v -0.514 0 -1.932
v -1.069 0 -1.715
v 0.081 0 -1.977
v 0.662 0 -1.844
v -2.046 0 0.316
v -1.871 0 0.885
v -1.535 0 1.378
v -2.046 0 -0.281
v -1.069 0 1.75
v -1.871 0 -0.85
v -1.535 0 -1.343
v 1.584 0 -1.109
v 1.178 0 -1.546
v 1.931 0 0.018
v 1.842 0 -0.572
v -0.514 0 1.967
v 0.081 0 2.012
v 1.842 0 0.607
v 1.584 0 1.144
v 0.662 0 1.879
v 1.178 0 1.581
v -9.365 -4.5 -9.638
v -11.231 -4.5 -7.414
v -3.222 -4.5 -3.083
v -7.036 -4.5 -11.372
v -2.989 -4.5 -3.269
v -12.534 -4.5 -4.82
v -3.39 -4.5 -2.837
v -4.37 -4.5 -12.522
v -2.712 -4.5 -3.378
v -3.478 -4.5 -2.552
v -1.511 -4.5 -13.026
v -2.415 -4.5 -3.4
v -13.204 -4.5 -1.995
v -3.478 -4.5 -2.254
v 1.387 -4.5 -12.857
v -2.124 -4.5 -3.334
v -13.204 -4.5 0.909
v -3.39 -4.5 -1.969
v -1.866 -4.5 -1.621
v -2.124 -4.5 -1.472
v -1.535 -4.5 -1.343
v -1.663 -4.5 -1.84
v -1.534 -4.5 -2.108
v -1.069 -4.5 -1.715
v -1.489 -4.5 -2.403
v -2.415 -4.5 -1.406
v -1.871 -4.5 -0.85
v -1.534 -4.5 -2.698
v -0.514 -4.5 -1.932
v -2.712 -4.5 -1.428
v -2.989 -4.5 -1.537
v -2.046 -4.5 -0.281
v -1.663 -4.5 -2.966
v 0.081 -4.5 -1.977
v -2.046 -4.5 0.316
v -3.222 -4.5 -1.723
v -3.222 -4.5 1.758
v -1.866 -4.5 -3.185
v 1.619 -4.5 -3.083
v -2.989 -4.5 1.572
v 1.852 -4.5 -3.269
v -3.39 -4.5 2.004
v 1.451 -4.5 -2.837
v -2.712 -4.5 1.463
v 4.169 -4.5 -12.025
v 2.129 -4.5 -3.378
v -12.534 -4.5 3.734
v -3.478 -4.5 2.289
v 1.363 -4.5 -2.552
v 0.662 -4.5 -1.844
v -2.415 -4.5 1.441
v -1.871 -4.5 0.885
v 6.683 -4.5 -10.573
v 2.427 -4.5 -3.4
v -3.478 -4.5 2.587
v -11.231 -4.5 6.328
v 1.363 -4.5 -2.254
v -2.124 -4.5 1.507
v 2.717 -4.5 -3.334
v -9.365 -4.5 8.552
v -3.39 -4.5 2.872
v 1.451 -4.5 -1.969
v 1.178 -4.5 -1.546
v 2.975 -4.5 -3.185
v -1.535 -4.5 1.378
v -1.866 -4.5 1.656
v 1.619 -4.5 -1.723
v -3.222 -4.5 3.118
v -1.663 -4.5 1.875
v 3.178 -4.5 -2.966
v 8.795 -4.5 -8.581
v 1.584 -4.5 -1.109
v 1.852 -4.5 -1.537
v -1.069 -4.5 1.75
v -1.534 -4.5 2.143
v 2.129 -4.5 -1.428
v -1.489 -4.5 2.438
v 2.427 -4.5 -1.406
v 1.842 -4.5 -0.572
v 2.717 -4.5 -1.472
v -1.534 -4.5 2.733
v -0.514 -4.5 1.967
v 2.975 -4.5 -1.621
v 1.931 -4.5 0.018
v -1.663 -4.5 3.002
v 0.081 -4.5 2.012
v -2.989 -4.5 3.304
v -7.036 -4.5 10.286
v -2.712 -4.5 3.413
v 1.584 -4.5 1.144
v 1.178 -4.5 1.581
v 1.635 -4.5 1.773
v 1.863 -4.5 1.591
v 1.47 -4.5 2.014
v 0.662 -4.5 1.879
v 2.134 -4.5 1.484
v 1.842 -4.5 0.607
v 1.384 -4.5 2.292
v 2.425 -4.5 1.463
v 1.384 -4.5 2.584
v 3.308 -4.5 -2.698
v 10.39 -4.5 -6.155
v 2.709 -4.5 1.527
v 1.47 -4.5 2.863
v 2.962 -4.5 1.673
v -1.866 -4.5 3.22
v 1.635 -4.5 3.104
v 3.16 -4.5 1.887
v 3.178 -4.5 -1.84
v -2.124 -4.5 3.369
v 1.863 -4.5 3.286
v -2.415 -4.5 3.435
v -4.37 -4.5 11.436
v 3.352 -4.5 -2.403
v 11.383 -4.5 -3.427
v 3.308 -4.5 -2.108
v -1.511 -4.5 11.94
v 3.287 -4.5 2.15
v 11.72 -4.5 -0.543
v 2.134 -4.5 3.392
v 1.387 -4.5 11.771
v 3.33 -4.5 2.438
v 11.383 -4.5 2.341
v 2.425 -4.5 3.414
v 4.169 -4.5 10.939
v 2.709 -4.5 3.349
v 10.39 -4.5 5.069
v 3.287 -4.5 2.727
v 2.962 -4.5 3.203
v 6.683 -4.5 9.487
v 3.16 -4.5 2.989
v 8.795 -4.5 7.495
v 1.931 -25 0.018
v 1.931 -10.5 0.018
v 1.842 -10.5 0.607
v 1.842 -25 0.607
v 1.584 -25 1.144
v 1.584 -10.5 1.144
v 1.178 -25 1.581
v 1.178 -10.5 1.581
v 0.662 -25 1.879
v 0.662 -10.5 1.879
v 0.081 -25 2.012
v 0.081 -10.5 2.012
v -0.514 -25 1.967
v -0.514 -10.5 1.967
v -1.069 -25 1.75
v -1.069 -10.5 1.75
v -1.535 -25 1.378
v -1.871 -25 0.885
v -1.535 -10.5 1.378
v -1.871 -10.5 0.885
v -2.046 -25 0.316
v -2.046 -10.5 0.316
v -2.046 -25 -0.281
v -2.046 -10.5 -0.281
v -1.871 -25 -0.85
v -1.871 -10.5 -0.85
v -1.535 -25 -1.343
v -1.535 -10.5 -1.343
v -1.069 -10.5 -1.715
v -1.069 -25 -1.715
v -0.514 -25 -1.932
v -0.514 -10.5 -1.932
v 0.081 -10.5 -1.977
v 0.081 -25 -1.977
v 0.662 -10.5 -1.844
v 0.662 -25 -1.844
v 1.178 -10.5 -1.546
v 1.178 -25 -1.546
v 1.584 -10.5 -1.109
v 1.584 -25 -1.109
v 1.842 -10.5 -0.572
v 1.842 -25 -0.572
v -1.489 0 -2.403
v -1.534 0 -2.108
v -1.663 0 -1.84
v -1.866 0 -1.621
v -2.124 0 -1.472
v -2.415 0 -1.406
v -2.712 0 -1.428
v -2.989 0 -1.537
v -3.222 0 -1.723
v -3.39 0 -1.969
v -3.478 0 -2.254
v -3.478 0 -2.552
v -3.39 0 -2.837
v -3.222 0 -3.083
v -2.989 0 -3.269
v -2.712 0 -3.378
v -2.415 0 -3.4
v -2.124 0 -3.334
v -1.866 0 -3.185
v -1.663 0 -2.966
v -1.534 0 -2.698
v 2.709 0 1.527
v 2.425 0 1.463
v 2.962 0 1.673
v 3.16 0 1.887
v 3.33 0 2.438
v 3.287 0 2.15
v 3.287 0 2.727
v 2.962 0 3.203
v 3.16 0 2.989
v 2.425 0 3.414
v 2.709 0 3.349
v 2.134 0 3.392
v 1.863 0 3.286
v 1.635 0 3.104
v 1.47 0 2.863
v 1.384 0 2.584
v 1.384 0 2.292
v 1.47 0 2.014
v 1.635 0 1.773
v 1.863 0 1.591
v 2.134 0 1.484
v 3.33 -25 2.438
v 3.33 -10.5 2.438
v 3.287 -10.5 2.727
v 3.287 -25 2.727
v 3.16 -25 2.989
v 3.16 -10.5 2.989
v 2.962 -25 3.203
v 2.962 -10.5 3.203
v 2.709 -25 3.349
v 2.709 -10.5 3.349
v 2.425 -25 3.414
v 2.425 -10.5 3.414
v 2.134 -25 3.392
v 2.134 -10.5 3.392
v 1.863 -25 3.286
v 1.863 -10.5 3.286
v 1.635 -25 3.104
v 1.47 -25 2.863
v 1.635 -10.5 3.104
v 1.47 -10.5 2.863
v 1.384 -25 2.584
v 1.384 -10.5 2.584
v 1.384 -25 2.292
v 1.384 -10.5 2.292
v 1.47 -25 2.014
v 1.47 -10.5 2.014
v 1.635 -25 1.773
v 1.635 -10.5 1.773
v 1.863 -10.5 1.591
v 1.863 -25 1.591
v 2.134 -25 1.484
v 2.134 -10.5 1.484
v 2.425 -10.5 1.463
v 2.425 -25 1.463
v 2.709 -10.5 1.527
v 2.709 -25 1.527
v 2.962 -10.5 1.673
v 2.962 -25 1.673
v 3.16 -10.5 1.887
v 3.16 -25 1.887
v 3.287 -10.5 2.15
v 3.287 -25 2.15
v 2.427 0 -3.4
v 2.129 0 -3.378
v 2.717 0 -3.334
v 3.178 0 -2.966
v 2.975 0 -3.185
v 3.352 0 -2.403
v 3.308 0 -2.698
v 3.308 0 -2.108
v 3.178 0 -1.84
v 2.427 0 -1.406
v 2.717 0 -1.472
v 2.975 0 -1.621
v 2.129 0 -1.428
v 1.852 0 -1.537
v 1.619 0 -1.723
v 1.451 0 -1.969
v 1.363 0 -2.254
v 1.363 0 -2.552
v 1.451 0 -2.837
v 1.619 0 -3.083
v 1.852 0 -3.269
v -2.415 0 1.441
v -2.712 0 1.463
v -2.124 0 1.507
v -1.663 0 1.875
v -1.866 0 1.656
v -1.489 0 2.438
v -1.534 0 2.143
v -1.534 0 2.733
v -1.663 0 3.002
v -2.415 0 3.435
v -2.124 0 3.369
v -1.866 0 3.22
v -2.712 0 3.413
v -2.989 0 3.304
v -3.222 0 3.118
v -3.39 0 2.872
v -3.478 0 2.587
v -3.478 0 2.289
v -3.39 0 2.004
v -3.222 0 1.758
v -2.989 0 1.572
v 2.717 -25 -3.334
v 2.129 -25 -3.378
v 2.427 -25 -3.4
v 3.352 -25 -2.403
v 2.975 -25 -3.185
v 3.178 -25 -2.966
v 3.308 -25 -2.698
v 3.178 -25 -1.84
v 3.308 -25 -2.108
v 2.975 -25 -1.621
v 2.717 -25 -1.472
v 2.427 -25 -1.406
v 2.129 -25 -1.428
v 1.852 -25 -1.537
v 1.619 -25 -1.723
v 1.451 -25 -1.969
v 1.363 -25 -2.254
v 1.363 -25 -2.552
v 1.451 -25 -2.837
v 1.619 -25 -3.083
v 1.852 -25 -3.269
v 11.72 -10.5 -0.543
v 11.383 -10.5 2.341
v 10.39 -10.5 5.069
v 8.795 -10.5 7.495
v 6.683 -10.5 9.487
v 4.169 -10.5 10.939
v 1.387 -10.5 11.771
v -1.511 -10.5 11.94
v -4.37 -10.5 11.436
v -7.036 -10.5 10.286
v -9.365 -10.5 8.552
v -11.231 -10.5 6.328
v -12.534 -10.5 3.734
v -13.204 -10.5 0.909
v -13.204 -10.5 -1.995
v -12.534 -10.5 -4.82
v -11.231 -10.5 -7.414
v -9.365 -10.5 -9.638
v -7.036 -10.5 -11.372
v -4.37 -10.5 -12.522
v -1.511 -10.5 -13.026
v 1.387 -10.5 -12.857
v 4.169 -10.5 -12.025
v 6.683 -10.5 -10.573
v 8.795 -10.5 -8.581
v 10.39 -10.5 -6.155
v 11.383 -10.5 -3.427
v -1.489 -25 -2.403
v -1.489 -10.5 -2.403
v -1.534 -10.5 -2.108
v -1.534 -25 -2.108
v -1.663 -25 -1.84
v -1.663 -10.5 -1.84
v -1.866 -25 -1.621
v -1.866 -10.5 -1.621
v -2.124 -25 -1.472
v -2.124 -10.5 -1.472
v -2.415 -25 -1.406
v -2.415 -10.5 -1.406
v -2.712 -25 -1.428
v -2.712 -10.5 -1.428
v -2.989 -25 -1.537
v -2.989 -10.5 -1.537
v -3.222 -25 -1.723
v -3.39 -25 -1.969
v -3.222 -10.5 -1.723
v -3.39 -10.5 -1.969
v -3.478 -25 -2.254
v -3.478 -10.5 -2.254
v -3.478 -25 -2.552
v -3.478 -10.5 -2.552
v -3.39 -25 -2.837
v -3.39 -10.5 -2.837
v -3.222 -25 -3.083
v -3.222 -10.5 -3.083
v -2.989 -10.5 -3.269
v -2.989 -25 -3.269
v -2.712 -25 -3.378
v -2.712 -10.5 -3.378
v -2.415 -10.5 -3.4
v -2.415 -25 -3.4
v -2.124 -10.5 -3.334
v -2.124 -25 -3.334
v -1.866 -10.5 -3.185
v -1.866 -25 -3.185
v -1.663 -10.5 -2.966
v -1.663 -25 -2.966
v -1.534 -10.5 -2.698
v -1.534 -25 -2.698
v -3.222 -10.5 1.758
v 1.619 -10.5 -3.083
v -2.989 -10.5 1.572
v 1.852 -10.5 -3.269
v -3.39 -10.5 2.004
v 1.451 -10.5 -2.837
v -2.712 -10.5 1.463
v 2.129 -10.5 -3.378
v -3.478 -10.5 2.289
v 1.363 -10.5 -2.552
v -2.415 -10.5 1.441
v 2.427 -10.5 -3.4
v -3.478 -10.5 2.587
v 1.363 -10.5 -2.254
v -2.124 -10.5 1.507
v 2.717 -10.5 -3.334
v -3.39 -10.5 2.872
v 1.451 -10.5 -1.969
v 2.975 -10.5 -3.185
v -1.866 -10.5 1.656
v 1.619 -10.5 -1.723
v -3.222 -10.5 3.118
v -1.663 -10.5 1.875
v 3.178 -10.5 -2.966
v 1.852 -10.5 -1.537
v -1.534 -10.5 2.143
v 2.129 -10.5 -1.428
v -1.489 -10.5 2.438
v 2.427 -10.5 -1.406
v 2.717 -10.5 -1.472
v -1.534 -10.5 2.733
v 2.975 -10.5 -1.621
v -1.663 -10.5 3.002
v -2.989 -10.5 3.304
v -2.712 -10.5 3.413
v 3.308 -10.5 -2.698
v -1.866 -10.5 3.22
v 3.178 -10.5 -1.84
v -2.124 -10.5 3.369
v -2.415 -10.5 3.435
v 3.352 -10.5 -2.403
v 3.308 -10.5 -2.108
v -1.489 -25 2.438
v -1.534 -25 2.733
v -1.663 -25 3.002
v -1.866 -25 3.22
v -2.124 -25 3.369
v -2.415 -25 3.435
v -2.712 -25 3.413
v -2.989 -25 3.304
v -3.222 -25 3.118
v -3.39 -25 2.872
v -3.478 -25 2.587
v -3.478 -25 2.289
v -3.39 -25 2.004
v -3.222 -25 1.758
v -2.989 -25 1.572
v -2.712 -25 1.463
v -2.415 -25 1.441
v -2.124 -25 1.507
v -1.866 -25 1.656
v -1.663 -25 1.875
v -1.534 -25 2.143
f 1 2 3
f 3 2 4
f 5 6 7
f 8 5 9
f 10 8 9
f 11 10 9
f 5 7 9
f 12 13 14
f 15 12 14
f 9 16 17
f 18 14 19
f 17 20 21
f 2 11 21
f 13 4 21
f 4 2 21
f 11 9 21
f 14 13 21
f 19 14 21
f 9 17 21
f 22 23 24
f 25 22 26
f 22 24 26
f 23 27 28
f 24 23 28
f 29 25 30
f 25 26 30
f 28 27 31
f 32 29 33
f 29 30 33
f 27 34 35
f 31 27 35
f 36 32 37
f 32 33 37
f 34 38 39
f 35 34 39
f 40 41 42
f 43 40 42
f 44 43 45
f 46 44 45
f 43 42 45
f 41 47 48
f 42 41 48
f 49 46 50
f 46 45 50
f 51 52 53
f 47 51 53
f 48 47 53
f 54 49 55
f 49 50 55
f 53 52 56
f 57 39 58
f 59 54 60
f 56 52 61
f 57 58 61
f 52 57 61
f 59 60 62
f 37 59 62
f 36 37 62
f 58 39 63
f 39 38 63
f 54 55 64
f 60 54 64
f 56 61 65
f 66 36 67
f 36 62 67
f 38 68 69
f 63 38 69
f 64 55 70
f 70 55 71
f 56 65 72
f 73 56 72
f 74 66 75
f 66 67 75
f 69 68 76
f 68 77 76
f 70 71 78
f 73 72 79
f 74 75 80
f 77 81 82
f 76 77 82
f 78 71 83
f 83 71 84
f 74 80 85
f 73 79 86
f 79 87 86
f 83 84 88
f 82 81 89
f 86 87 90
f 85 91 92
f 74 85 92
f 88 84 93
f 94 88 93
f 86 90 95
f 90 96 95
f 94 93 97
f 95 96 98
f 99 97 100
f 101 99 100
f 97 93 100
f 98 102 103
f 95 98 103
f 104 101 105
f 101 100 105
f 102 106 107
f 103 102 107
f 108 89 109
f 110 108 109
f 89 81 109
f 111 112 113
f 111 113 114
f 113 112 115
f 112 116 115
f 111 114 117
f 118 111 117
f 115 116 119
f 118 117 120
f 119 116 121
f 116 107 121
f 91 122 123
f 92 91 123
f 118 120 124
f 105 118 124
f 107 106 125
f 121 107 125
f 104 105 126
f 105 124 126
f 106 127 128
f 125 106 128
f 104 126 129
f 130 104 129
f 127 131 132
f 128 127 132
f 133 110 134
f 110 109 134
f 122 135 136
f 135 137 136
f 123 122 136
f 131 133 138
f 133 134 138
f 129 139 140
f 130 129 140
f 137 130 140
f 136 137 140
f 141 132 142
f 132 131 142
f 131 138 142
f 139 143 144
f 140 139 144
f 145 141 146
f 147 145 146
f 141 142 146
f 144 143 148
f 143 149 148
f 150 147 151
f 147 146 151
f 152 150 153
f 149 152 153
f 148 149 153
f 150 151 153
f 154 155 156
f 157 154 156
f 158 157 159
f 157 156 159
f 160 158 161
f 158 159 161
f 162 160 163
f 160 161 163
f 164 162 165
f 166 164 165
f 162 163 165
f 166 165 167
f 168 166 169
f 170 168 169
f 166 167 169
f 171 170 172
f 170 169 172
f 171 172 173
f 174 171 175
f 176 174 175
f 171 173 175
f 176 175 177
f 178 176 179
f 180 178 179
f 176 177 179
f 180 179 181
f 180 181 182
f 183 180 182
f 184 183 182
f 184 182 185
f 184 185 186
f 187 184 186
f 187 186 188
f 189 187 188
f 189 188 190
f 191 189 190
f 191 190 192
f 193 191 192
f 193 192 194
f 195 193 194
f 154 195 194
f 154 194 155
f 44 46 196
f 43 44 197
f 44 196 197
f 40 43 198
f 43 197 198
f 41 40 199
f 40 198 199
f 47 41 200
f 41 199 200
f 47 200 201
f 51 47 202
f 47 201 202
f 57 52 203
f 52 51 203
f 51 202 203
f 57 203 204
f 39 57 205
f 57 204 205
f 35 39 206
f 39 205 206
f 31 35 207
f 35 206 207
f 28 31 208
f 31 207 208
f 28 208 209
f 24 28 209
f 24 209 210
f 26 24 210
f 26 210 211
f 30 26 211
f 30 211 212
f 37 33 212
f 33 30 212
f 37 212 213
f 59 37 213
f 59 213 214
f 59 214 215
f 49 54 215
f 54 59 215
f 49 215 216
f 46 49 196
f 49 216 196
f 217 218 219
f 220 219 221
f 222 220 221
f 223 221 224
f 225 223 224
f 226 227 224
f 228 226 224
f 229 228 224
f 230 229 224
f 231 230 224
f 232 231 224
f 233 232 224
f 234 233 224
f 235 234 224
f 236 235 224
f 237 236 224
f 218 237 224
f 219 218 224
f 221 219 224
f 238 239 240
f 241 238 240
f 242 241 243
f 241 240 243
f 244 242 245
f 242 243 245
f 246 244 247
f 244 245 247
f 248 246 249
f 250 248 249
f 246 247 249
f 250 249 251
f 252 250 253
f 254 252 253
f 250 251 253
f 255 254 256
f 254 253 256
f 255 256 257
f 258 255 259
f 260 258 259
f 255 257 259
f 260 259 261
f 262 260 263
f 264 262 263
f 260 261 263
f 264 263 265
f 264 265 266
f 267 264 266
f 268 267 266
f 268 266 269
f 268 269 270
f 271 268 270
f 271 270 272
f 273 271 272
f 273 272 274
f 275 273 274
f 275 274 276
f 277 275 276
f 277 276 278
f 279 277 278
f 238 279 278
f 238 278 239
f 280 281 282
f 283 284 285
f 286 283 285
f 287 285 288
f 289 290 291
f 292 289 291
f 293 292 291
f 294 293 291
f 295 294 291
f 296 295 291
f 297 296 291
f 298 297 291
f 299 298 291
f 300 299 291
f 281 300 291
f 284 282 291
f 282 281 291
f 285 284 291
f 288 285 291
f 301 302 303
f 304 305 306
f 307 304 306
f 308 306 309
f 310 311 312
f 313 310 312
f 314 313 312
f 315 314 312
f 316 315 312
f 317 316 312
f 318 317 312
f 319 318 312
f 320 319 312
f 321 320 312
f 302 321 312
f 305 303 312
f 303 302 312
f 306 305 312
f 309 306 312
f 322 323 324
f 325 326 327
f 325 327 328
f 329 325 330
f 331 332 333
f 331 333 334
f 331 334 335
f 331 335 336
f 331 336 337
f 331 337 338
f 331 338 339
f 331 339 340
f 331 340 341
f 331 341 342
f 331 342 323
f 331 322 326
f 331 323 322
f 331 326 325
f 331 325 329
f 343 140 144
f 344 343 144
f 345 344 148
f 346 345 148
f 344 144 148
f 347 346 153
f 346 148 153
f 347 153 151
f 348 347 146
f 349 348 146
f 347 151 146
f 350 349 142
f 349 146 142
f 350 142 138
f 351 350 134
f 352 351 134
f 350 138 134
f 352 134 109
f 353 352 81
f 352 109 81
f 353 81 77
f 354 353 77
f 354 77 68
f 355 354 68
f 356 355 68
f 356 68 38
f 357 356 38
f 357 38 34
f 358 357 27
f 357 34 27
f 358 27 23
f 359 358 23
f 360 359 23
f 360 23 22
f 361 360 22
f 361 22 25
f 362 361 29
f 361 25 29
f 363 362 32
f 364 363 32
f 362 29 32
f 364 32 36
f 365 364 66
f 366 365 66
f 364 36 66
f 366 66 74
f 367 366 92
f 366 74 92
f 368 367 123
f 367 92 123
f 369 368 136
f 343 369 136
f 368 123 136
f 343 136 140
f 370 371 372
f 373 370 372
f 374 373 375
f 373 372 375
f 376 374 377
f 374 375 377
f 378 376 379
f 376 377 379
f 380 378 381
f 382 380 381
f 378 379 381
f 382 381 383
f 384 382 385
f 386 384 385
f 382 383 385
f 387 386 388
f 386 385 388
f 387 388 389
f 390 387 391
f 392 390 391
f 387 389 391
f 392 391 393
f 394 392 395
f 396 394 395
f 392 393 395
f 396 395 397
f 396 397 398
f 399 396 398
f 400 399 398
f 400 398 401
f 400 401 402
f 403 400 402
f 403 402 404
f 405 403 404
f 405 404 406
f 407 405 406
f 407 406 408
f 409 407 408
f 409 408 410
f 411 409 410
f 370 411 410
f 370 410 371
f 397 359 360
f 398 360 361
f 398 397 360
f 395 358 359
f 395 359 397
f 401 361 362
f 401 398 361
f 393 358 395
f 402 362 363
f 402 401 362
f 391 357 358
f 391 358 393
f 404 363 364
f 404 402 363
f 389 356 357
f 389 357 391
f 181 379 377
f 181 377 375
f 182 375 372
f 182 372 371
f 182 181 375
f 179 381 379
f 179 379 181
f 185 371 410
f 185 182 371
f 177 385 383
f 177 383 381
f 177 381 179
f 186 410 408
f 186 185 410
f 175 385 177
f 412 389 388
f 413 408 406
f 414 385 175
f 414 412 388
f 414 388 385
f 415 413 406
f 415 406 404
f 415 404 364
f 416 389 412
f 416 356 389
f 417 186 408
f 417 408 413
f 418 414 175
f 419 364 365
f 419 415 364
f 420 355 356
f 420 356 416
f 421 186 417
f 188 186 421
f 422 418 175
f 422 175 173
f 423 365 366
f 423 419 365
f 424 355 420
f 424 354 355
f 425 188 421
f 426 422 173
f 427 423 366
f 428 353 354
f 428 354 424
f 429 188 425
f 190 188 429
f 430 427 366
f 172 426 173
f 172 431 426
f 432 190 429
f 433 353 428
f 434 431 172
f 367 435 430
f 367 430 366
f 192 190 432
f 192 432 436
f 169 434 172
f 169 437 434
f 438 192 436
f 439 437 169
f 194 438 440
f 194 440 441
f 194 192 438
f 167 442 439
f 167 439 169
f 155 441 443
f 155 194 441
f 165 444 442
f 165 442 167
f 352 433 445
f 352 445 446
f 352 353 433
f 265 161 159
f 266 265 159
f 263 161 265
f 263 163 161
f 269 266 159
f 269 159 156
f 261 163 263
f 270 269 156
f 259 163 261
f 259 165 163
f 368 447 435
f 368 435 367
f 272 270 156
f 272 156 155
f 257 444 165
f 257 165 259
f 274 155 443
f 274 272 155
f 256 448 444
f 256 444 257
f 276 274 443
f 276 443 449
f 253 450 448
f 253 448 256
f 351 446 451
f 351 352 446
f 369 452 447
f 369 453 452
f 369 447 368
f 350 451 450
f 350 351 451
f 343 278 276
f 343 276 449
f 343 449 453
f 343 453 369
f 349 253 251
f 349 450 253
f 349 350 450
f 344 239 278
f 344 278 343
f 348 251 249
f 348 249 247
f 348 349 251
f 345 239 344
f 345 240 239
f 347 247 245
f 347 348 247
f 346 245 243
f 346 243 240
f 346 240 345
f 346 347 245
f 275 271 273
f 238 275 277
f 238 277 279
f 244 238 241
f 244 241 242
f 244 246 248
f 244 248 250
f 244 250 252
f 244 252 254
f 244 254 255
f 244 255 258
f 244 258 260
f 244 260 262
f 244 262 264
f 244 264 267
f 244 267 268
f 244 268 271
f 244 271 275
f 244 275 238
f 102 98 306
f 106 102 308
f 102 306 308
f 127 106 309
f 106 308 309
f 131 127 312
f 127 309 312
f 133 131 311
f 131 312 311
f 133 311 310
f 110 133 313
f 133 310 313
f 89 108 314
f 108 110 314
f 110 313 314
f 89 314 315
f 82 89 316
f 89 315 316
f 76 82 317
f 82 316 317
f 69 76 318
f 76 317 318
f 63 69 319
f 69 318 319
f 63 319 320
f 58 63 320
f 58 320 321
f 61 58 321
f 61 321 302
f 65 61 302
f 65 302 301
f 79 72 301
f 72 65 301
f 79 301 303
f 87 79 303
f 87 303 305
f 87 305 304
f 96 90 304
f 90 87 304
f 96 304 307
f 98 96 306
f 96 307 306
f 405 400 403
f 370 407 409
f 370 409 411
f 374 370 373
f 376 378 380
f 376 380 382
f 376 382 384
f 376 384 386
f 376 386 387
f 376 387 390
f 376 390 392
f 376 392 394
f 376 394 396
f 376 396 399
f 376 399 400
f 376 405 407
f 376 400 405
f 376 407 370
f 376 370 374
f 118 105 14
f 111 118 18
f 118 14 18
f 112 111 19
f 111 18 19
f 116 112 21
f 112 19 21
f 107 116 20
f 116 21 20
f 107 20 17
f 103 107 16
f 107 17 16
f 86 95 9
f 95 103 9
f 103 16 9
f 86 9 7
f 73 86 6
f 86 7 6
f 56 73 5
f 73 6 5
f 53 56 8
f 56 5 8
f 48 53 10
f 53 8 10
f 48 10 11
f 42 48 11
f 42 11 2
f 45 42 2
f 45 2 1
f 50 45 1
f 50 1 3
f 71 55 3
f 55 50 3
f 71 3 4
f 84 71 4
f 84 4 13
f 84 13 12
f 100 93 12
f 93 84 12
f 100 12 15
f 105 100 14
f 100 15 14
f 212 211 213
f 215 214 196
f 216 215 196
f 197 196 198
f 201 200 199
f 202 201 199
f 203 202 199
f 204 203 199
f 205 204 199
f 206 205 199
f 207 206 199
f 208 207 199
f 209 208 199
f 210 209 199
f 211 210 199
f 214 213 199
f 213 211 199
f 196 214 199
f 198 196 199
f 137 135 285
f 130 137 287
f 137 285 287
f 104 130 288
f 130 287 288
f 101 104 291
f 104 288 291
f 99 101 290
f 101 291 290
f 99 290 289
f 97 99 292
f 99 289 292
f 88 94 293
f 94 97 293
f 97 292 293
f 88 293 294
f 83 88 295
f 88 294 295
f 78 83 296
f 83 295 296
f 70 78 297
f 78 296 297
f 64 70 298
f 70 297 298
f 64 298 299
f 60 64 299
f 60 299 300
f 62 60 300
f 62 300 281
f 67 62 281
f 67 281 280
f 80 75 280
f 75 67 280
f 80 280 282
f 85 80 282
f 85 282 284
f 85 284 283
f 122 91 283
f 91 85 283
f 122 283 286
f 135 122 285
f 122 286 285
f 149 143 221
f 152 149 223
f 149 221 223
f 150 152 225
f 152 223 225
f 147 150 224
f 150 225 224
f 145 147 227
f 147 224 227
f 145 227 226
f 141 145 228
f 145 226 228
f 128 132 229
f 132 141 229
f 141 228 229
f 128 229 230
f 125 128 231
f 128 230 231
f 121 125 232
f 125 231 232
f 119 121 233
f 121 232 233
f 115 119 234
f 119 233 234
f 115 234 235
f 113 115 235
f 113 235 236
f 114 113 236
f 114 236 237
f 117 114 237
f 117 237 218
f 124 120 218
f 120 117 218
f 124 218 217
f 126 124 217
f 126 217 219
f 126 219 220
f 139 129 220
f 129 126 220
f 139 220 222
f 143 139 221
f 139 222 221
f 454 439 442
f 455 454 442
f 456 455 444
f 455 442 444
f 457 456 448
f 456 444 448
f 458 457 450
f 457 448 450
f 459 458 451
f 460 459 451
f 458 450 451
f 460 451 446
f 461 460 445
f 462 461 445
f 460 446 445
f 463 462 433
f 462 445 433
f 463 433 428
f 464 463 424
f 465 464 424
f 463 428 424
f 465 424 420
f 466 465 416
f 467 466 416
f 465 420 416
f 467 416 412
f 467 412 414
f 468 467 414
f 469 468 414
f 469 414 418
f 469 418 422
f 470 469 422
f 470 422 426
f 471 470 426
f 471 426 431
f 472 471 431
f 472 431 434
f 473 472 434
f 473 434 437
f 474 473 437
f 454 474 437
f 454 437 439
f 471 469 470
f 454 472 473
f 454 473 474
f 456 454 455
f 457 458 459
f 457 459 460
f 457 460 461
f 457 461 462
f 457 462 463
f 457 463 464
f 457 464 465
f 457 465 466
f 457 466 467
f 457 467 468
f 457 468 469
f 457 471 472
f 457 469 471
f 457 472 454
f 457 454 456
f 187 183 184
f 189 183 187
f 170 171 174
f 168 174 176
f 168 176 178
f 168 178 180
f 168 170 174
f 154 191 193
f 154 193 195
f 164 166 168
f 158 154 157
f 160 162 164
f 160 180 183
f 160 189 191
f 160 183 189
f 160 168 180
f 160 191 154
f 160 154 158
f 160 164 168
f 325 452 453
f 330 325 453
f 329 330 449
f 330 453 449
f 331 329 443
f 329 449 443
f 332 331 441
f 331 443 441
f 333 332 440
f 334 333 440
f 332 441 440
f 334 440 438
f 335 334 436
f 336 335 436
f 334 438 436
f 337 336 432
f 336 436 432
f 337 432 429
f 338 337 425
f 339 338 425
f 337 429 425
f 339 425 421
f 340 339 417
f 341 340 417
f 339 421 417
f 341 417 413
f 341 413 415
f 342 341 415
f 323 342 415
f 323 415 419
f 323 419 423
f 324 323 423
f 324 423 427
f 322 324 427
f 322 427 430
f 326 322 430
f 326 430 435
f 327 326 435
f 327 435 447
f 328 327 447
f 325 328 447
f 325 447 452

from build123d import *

# Parameters (mm, degrees)
F0_R     = 12.504289
F1_DEPTH = 6
F2_R     = 1
F2_R_2   = 0.978426
F2_R_3   = 2
F4_DEPTH = 25


with BuildPart() as f1:
    # F0 (on Front) → F1 (new body)
    with BuildSketch(Plane.XZ):
        with Locations((-13.58404, 22.957029)):
            Circle(F0_R)
    extrude(amount=F1_DEPTH)


with BuildPart() as f1_1:
    # F3: moved
    add(f1.part.moved(Location((12.8, -4.5, -23.5))))

    # F2 (on Front) → F4 (join)
    with BuildSketch(Plane.XZ):
        with Locations((-2.489394, 2.438227)):
            Circle(F2_R)
        with Locations((2.351993, 2.438227)):
            Circle(F2_R_2)
        with Locations((-2.489394, -2.40316)):
            Circle(F2_R)
        with Locations((2.351993, -2.40316)):
            Circle(F2_R)
        with Locations((-0.0687, 0.017533)):
            Circle(F2_R_3)
    extrude(amount=F4_DEPTH)


solid = f1_1.part
